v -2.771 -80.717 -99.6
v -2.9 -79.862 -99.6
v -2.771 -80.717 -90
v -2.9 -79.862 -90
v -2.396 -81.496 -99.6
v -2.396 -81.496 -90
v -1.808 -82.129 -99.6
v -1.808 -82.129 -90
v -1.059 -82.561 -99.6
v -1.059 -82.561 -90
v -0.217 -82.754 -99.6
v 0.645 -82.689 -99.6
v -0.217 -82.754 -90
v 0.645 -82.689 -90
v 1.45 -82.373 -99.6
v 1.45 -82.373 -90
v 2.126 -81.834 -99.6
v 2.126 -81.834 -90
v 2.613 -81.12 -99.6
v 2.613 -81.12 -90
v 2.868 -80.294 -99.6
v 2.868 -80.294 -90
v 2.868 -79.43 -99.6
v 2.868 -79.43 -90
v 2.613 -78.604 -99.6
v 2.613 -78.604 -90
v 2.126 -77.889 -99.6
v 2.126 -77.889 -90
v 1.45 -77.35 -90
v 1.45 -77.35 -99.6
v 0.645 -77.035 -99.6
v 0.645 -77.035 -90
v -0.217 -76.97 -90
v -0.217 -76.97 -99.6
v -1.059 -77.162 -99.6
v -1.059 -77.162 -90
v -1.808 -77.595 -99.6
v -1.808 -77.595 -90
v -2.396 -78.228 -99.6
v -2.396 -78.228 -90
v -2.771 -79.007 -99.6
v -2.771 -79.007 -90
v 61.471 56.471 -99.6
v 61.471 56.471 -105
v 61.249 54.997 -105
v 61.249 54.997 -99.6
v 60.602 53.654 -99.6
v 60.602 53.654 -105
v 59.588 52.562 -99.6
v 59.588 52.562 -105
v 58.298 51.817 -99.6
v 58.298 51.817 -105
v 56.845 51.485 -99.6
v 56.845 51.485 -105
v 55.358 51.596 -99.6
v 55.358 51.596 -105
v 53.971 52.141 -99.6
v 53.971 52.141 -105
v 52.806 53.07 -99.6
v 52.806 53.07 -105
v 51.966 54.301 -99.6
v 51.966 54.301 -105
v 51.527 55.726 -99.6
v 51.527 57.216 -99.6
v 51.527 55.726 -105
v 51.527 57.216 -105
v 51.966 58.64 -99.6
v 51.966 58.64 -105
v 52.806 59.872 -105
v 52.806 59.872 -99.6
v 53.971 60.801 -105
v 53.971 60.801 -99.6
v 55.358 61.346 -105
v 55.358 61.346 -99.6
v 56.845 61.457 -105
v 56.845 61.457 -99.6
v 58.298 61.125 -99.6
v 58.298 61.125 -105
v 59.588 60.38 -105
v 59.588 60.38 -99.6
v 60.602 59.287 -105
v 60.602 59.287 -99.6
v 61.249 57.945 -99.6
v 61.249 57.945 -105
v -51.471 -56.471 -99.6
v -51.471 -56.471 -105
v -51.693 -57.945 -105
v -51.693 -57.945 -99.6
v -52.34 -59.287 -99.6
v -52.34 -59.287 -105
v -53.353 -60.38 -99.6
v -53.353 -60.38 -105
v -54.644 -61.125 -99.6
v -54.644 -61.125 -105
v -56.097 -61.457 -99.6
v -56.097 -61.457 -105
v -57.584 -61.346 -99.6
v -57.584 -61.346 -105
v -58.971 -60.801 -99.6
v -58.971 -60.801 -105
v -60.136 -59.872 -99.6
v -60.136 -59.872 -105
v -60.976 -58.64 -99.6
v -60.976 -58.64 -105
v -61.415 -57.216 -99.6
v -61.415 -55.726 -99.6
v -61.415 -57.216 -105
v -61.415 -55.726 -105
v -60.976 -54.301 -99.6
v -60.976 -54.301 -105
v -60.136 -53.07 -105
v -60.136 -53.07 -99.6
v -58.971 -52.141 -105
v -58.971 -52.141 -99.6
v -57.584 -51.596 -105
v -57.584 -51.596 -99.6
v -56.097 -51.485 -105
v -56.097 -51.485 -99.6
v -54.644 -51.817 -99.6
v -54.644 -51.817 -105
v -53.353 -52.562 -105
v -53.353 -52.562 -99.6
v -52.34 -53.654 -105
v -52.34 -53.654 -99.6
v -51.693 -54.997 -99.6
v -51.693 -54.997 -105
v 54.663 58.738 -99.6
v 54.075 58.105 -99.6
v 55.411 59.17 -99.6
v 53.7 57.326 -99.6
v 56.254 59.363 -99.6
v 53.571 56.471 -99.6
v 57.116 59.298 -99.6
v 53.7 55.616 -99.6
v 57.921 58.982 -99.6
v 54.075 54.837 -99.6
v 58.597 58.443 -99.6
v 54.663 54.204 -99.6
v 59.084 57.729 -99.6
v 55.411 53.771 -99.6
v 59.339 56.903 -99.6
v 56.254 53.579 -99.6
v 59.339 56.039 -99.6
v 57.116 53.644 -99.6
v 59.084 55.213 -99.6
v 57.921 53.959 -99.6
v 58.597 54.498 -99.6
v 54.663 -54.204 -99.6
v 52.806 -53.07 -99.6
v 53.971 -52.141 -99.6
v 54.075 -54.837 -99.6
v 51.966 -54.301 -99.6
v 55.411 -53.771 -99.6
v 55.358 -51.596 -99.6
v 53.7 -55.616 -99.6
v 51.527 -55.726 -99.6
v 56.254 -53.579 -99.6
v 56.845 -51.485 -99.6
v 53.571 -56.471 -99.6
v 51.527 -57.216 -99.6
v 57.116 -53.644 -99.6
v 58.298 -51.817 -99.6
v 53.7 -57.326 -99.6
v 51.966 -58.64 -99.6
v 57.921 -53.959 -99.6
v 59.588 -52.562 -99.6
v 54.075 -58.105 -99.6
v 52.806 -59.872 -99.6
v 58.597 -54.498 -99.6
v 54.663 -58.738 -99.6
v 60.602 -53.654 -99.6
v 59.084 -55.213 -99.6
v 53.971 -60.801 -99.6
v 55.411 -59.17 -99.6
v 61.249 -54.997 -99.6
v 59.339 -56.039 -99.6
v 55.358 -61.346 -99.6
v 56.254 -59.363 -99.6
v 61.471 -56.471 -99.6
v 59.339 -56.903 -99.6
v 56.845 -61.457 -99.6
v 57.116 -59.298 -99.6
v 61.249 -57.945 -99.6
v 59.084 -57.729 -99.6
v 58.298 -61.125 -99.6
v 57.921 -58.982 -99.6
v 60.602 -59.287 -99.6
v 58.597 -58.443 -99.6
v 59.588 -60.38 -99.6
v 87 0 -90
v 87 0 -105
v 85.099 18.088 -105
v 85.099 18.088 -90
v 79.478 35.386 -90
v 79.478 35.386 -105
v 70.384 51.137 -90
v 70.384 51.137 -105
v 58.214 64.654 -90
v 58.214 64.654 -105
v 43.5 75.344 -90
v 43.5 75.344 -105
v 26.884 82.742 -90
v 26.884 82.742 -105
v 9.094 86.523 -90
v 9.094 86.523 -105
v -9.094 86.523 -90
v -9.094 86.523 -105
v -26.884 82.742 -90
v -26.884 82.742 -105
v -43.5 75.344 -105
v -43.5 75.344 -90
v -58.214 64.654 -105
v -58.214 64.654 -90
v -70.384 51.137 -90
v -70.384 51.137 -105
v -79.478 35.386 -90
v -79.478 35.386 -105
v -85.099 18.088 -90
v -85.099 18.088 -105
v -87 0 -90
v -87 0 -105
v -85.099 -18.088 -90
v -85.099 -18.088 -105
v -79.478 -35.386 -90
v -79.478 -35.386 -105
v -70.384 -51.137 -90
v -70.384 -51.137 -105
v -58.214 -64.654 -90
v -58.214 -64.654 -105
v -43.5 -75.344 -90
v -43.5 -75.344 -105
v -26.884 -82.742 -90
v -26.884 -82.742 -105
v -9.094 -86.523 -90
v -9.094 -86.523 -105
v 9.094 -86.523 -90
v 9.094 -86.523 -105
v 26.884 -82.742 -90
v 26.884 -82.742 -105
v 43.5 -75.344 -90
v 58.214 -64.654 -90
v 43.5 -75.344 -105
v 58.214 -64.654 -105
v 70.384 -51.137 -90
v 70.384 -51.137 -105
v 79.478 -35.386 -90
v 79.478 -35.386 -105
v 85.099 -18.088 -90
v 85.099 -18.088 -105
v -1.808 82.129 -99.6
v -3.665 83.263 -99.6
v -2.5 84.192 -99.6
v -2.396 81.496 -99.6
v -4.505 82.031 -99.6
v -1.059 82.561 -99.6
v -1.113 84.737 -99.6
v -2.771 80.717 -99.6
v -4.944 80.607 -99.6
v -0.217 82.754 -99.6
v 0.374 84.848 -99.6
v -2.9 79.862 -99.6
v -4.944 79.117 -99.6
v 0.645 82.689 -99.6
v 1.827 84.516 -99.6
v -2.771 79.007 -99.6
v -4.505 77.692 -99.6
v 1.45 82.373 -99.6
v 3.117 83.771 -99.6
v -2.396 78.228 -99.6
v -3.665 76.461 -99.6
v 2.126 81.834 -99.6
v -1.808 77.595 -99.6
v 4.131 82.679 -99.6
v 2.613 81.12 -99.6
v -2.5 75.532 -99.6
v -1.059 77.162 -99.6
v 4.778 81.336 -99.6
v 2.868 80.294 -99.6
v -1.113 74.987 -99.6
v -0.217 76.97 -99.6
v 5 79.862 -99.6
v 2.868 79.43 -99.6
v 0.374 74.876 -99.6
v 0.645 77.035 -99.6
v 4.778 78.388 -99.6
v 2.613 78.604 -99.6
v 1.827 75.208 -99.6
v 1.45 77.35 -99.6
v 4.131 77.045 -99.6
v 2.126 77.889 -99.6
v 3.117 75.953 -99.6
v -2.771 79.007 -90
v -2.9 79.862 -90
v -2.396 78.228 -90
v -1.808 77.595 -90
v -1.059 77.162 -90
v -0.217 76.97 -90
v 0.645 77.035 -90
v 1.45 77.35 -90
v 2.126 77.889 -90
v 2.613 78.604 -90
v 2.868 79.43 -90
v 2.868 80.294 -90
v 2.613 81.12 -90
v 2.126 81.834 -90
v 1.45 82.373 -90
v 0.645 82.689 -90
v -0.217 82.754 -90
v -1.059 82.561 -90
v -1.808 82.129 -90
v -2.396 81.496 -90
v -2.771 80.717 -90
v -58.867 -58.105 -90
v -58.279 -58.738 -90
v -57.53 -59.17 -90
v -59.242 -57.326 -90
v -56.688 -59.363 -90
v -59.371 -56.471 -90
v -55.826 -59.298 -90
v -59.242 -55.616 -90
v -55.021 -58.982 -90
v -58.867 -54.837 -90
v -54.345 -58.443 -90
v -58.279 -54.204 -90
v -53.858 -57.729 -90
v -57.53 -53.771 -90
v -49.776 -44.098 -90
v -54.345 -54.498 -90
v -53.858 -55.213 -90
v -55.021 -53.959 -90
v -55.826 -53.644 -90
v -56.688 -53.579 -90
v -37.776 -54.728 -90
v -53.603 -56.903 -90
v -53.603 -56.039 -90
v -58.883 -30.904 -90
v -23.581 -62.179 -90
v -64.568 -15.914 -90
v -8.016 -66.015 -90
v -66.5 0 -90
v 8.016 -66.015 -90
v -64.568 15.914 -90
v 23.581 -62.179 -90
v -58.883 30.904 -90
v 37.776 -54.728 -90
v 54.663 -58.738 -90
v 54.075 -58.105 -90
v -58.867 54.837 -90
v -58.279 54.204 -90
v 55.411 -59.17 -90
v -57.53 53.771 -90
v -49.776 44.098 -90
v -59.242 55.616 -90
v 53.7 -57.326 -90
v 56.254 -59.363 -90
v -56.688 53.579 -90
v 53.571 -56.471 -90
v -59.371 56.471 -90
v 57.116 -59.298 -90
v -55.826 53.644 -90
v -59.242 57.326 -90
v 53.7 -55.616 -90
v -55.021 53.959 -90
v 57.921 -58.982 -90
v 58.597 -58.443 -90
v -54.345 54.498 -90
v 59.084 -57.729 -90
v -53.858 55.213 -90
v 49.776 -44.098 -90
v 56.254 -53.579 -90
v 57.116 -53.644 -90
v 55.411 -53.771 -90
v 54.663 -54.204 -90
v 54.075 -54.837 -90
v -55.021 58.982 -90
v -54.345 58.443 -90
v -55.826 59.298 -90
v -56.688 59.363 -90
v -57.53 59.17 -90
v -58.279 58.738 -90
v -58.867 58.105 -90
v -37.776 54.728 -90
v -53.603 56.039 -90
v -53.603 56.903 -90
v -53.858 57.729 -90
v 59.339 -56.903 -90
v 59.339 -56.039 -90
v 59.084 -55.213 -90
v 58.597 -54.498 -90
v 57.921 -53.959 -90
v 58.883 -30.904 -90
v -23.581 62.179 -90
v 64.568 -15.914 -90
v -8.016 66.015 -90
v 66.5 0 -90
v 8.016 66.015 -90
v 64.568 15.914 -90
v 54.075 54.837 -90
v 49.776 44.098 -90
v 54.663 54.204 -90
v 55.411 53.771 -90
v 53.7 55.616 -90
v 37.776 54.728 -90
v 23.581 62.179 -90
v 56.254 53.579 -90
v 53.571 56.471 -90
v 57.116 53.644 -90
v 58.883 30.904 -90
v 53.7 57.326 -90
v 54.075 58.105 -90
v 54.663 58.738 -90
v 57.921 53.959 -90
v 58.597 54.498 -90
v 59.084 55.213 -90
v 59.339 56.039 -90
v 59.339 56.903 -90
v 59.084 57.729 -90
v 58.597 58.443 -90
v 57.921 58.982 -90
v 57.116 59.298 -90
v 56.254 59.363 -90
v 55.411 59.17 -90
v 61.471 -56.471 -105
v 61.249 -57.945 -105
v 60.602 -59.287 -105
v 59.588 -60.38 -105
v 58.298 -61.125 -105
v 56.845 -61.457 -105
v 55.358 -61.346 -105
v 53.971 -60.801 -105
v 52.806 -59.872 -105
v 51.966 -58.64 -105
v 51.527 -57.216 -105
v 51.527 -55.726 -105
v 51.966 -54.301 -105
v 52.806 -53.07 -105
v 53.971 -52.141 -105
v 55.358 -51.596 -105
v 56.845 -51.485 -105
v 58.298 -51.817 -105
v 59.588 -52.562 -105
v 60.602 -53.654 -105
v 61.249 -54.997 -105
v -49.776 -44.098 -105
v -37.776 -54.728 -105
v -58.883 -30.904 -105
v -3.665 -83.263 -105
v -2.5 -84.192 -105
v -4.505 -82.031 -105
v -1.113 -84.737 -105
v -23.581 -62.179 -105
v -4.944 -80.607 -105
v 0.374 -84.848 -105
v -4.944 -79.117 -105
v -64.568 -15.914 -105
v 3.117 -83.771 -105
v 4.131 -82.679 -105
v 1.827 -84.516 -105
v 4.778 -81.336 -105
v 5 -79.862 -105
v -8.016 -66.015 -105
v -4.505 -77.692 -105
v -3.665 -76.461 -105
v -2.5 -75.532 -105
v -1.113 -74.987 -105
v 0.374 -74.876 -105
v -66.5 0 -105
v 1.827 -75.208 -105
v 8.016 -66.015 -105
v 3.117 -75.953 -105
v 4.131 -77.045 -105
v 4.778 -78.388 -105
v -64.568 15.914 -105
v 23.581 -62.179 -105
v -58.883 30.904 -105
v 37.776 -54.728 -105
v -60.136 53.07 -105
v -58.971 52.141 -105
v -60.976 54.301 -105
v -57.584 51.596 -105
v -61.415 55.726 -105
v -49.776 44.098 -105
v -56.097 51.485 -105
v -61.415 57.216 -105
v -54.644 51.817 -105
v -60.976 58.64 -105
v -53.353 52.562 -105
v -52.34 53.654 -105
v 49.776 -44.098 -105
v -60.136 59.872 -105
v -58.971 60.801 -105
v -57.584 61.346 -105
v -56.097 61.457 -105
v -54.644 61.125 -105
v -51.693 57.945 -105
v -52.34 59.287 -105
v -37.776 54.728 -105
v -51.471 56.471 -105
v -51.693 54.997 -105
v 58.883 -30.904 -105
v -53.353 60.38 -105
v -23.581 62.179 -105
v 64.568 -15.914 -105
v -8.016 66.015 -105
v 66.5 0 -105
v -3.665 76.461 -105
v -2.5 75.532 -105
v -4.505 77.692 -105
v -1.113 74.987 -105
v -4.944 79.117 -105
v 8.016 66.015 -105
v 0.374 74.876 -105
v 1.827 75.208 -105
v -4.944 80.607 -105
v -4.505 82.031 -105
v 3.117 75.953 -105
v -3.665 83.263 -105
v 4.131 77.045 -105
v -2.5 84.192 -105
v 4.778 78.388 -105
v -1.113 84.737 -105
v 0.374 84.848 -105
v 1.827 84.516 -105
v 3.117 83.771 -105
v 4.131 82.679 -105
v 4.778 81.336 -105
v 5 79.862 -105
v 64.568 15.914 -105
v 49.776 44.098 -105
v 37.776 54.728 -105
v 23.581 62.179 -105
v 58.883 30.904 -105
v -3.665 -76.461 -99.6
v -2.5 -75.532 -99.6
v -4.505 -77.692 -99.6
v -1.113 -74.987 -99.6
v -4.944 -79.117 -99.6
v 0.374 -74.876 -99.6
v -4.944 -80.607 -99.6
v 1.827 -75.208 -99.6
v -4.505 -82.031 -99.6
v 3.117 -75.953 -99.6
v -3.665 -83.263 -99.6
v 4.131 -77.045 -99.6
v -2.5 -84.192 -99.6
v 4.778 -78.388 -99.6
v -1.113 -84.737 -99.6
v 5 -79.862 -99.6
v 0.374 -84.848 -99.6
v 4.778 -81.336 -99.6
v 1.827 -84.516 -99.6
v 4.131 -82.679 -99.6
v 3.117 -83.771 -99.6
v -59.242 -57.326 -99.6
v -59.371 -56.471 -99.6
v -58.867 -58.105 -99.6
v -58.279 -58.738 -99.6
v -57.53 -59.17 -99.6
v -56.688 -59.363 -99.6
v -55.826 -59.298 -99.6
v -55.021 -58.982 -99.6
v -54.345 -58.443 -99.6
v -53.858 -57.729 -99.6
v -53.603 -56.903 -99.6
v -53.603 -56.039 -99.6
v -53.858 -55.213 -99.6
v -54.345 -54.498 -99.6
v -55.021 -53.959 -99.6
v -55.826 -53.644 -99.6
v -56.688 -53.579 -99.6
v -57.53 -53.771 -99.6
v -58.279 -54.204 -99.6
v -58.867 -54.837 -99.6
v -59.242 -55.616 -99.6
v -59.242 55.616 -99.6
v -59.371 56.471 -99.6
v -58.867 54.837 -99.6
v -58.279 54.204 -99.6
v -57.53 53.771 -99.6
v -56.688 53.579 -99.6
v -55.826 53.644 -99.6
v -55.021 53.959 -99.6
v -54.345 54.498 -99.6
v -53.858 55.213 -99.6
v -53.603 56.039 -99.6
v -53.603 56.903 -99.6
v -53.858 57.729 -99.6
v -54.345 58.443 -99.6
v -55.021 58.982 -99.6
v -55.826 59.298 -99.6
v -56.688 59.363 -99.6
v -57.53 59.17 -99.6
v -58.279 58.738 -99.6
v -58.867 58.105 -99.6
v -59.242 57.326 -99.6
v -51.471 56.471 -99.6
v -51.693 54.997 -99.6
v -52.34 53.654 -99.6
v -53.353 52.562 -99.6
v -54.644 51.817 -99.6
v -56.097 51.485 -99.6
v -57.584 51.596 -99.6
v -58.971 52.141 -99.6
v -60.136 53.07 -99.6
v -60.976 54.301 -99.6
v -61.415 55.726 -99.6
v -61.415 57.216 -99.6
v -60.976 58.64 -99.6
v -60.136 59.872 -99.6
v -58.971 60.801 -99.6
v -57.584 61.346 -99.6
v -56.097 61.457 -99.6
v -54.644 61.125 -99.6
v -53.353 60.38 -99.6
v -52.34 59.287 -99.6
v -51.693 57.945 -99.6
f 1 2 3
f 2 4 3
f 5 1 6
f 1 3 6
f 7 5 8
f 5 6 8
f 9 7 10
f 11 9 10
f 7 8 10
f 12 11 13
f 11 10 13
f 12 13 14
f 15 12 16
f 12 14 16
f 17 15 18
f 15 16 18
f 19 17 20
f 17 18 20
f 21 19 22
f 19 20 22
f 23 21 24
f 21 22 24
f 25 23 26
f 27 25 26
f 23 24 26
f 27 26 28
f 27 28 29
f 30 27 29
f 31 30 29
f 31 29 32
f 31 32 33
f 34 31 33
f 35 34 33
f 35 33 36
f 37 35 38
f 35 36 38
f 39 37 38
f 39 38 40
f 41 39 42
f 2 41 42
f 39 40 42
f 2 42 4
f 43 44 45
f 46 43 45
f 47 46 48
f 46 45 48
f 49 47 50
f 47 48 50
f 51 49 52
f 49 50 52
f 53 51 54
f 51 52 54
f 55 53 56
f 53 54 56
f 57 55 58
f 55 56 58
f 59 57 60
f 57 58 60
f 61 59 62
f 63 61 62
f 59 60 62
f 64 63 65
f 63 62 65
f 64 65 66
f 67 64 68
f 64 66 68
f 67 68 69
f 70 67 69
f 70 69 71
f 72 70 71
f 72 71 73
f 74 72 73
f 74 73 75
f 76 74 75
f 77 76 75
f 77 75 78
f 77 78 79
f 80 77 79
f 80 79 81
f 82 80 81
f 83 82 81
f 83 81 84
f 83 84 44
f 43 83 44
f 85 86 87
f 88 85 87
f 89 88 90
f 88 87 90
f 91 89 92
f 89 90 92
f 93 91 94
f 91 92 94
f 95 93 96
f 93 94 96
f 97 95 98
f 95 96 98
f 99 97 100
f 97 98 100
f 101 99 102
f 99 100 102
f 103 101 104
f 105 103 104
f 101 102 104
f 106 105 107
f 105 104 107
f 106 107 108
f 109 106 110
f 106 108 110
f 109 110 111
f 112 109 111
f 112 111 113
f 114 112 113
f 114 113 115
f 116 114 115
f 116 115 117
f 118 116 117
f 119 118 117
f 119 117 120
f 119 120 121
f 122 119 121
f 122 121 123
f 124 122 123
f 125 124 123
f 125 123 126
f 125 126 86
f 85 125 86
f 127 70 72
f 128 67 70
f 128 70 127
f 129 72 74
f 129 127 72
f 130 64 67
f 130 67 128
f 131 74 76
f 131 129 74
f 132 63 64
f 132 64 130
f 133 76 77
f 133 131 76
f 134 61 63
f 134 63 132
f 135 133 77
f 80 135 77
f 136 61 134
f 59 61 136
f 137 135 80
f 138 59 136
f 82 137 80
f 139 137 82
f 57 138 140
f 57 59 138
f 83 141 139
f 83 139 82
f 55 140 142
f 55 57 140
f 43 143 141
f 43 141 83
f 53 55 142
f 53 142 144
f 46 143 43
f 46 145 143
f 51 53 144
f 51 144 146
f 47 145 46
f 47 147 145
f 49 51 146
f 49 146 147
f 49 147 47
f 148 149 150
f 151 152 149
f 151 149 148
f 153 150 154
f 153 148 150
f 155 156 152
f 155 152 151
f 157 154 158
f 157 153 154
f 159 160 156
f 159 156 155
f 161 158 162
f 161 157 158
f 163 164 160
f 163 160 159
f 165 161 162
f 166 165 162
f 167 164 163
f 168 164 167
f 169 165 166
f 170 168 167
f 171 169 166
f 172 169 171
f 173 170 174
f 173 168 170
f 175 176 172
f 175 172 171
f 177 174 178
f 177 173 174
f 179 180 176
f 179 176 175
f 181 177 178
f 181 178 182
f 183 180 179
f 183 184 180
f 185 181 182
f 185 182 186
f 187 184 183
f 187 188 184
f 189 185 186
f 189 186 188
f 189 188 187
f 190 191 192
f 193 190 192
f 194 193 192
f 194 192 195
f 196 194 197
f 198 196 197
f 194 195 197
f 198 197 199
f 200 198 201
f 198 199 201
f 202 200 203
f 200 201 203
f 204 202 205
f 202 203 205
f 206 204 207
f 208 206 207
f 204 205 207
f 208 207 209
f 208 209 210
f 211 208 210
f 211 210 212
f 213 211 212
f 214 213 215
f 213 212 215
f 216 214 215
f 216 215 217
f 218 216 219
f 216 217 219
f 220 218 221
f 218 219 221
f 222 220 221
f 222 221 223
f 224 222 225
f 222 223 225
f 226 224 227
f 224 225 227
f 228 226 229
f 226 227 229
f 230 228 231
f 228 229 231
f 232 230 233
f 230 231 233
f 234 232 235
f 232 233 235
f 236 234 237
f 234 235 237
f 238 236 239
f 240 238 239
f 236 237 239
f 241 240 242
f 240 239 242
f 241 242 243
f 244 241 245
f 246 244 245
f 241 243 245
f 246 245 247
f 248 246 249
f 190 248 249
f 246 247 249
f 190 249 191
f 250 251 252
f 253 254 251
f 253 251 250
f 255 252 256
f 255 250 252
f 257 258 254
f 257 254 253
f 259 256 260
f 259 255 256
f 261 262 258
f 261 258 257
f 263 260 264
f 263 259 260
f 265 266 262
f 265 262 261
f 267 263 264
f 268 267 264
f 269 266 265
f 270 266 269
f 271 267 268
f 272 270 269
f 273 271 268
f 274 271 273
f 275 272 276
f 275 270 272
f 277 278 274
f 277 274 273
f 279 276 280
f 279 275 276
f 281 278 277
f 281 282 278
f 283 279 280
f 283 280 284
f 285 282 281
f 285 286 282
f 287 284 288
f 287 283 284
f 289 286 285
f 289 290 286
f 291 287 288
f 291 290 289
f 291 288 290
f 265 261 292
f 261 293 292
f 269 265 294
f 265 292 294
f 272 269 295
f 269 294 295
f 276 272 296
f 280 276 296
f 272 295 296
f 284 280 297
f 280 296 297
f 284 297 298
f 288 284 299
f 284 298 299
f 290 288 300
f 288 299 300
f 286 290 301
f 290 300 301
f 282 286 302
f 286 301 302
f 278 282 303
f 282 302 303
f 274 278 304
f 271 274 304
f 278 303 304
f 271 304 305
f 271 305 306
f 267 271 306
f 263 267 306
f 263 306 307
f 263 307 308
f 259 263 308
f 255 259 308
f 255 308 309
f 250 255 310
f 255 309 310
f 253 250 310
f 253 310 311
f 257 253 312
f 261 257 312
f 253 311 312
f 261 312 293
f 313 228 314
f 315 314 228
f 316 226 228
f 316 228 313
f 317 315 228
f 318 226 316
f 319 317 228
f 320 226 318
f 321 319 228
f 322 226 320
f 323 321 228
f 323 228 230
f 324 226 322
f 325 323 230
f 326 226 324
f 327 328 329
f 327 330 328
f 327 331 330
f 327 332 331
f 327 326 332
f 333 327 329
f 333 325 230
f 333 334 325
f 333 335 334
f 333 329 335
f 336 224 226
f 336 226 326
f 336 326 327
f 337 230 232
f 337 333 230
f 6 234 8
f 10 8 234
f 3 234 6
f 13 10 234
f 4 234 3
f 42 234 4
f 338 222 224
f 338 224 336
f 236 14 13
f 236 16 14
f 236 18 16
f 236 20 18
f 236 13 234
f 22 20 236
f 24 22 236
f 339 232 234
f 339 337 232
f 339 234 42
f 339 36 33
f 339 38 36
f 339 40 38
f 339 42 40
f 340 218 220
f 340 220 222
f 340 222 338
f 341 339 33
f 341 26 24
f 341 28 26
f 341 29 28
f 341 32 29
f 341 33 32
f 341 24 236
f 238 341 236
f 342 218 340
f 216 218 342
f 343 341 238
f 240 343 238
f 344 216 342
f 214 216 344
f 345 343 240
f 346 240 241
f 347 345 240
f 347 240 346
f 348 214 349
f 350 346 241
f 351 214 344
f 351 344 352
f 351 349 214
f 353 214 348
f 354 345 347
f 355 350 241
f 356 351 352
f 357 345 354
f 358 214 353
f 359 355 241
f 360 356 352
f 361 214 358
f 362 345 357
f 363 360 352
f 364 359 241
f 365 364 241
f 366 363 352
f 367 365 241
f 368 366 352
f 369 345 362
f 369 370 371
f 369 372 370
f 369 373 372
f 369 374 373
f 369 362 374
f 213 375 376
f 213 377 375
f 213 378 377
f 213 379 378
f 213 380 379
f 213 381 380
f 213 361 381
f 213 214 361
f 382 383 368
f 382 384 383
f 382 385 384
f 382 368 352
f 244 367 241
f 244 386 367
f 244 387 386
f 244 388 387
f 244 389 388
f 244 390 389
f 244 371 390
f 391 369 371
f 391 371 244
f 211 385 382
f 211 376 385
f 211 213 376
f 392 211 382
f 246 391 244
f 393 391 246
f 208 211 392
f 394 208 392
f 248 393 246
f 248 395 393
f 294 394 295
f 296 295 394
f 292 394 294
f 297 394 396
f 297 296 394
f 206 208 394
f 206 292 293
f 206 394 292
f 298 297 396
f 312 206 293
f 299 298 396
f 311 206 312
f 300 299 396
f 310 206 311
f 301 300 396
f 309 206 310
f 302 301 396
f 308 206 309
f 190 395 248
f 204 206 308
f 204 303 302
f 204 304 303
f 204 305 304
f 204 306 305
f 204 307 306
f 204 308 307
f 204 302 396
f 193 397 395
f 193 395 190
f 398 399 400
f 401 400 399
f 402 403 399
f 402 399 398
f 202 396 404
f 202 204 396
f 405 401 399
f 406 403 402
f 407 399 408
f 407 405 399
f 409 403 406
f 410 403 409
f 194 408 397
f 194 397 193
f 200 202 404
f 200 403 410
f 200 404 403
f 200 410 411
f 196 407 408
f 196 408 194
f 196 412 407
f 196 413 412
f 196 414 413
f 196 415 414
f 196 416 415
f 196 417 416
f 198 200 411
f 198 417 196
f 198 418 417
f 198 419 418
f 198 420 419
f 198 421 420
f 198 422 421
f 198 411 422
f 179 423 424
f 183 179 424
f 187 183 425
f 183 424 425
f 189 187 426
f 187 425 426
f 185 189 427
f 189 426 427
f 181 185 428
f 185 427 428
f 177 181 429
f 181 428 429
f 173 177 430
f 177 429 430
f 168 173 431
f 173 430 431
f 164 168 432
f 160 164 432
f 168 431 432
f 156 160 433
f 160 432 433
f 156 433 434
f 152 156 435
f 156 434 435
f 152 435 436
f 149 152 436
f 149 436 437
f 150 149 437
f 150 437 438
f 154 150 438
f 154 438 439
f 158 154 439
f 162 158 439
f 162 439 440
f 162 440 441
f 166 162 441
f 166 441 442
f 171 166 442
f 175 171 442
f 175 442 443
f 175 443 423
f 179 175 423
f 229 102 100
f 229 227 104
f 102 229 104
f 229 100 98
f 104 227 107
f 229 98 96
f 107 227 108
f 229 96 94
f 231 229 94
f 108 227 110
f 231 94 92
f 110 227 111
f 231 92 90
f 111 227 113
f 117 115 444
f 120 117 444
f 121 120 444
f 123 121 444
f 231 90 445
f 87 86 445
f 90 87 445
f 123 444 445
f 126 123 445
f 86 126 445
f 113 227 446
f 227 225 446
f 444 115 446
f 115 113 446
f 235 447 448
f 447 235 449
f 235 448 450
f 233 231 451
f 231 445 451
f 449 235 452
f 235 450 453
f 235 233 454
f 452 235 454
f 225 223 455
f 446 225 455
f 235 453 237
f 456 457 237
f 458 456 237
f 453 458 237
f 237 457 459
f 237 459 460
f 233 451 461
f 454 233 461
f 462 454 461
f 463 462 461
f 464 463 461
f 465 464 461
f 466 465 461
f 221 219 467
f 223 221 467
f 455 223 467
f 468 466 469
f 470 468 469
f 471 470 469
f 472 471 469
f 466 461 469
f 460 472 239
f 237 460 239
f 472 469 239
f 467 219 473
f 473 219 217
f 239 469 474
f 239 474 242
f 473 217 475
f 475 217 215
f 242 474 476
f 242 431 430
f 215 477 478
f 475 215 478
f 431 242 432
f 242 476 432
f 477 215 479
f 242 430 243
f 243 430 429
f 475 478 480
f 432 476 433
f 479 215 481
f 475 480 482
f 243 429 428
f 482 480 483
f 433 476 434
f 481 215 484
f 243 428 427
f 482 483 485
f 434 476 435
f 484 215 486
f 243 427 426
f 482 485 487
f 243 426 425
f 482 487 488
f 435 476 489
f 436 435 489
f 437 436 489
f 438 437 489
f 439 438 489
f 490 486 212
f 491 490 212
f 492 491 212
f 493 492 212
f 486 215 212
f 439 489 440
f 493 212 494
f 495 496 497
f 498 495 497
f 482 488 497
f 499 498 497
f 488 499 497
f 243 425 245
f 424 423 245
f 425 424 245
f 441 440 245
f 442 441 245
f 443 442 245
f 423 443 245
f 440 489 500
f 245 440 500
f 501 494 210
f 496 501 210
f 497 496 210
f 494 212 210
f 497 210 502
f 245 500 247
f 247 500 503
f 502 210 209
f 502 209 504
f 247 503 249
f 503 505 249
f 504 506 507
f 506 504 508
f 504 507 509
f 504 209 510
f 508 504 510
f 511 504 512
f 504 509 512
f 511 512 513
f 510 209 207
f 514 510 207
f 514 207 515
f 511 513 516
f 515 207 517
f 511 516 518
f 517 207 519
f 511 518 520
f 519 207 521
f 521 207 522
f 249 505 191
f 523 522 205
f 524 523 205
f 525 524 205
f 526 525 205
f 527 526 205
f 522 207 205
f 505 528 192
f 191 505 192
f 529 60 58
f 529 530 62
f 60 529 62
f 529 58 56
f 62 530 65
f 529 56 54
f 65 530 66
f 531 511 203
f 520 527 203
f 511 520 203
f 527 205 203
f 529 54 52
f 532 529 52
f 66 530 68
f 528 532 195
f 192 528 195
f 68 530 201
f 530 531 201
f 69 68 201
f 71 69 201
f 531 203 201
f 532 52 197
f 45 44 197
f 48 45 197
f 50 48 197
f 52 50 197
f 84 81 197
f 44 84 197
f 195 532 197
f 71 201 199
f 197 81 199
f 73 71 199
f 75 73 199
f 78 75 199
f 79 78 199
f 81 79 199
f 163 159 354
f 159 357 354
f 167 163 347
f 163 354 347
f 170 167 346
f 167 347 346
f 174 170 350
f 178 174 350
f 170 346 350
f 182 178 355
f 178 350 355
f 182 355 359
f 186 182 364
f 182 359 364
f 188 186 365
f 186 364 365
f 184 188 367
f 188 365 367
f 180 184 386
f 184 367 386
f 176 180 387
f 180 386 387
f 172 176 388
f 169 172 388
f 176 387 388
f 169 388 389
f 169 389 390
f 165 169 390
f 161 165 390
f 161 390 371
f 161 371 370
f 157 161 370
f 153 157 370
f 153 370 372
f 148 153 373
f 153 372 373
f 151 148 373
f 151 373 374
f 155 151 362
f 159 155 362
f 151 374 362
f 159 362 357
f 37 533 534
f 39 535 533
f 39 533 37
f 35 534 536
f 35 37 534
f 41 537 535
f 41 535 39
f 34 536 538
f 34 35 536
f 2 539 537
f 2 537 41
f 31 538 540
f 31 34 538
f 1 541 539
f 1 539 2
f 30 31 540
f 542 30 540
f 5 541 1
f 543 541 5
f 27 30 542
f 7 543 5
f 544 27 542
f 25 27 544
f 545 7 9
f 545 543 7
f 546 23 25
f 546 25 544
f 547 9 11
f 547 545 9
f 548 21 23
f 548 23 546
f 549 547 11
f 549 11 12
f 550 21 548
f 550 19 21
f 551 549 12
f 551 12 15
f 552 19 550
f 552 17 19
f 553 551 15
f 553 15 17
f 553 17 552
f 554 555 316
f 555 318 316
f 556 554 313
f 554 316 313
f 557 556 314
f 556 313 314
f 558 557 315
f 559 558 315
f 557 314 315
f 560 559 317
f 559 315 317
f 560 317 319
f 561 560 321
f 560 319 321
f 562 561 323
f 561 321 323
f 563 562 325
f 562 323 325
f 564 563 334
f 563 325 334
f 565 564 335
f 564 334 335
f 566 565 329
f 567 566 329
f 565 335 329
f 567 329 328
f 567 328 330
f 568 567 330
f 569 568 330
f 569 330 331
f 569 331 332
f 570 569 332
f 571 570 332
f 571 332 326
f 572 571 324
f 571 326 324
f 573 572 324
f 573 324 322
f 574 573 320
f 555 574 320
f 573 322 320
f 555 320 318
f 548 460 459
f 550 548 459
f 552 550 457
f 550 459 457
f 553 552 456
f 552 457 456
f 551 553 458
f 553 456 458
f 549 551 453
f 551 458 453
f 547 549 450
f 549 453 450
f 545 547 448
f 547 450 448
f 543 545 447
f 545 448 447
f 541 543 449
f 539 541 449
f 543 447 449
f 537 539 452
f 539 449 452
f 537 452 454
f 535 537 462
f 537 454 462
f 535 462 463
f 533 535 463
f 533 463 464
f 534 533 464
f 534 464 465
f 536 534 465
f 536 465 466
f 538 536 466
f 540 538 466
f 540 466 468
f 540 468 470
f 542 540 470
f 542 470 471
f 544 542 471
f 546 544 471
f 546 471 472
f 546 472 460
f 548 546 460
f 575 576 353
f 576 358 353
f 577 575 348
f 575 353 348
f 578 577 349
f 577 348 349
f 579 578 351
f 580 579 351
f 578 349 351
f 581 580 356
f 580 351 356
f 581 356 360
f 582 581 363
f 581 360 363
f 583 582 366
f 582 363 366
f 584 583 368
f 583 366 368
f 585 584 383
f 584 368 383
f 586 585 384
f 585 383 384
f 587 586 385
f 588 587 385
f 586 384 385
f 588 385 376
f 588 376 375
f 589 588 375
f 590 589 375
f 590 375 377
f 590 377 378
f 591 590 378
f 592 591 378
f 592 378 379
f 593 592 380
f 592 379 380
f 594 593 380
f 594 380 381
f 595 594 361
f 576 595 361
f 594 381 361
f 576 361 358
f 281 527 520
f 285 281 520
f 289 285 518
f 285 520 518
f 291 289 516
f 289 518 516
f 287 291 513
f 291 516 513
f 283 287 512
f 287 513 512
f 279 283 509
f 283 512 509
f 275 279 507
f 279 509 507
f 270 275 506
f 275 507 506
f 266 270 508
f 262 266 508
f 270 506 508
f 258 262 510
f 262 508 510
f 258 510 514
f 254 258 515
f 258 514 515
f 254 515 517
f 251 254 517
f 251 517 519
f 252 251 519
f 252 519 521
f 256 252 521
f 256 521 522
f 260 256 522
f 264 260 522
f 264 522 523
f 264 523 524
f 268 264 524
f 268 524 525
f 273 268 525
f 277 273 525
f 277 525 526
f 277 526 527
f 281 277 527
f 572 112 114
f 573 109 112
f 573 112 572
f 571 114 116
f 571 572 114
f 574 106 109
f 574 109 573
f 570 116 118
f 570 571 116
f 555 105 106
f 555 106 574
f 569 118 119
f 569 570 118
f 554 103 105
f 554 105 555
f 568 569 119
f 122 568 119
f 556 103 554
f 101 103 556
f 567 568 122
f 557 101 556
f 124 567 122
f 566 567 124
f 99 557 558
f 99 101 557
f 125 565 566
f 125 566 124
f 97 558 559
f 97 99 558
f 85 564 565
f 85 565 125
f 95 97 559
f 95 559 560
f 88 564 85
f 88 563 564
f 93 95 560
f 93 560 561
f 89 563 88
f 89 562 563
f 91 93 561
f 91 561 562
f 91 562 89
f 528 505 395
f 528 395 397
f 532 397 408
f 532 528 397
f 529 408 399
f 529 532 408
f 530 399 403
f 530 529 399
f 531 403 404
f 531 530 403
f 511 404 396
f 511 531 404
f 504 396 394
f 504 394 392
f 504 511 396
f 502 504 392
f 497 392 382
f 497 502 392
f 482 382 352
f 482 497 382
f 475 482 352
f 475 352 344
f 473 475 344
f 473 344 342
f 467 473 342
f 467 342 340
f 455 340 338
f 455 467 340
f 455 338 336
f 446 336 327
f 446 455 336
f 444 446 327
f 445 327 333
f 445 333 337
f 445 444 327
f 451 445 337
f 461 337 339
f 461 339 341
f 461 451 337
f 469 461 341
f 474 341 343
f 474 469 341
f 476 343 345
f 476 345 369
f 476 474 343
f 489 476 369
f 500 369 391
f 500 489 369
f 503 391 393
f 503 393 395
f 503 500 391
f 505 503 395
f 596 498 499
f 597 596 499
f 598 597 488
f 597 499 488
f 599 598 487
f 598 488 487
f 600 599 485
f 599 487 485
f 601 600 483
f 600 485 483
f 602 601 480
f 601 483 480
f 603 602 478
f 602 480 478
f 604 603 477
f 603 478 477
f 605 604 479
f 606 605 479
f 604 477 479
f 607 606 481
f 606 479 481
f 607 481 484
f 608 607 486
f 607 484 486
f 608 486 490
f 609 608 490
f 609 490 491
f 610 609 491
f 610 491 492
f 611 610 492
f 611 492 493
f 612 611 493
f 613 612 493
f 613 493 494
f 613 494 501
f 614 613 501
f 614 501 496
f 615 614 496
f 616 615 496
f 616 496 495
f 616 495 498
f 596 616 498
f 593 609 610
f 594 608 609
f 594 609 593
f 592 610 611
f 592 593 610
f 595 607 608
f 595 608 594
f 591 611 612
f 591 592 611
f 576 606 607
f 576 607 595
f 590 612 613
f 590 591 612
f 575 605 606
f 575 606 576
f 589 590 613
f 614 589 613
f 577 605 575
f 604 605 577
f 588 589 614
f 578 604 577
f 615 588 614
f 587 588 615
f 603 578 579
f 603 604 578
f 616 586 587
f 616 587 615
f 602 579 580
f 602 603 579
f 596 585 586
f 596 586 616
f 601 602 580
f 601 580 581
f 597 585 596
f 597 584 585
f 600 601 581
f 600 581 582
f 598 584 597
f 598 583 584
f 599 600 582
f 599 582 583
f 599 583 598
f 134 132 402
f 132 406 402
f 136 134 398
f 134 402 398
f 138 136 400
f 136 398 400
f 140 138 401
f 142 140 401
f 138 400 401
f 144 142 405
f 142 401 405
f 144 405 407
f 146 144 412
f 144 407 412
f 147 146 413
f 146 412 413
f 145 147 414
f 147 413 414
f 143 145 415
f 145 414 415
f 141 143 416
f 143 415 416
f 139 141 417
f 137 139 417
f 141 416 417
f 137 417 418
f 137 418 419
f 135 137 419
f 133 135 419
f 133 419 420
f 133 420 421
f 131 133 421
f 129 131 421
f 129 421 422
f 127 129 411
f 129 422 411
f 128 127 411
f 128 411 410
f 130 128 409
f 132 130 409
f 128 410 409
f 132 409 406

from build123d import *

# Parameters (mm, degrees)
CYLINDER057_R       = 87
CYLINDER057_DEPTH   = 15
CYLINDER058_R       = 66.5
CYLINDER058_DEPTH   = 15
HOLE019_D           = 5.8
HOLE019_DEPTH       = 25
HOLE019_CBORE_D     = 10
HOLE019_CBORE_DEPTH = 5.4


with BuildPart() as part:
    # Cylinder057 → Cylinder057 (join)
    with BuildSketch(Plane.XY):
        Circle(CYLINDER057_R)
    extrude(amount=CYLINDER057_DEPTH)

    # Cylinder058 → Cylinder058 (cut)
    with BuildSketch(Plane.XY):
        Circle(CYLINDER058_R)
    extrude(amount=CYLINDER058_DEPTH, mode=Mode.SUBTRACT)

    # Hole019
    with Locations(Plane(origin=(0, 0, 0), x_dir=(1, 0, 0), z_dir=(0, 0, -1))):
        with Locations((0, -79.861908), (56.470897, -56.470897), (56.470897, 56.470897), (0, 79.861908), (-56.470897, 56.470897), (-56.470897, -56.470897), (0, -79.861908)):
            CounterBoreHole(HOLE019_D / 2, HOLE019_CBORE_D / 2, HOLE019_CBORE_DEPTH, depth=HOLE019_DEPTH)


with BuildPart() as part_1:
    # Body055 placement: moved
    add(part.part.moved(Location((0, 0, -105))))


solid = part_1.part
